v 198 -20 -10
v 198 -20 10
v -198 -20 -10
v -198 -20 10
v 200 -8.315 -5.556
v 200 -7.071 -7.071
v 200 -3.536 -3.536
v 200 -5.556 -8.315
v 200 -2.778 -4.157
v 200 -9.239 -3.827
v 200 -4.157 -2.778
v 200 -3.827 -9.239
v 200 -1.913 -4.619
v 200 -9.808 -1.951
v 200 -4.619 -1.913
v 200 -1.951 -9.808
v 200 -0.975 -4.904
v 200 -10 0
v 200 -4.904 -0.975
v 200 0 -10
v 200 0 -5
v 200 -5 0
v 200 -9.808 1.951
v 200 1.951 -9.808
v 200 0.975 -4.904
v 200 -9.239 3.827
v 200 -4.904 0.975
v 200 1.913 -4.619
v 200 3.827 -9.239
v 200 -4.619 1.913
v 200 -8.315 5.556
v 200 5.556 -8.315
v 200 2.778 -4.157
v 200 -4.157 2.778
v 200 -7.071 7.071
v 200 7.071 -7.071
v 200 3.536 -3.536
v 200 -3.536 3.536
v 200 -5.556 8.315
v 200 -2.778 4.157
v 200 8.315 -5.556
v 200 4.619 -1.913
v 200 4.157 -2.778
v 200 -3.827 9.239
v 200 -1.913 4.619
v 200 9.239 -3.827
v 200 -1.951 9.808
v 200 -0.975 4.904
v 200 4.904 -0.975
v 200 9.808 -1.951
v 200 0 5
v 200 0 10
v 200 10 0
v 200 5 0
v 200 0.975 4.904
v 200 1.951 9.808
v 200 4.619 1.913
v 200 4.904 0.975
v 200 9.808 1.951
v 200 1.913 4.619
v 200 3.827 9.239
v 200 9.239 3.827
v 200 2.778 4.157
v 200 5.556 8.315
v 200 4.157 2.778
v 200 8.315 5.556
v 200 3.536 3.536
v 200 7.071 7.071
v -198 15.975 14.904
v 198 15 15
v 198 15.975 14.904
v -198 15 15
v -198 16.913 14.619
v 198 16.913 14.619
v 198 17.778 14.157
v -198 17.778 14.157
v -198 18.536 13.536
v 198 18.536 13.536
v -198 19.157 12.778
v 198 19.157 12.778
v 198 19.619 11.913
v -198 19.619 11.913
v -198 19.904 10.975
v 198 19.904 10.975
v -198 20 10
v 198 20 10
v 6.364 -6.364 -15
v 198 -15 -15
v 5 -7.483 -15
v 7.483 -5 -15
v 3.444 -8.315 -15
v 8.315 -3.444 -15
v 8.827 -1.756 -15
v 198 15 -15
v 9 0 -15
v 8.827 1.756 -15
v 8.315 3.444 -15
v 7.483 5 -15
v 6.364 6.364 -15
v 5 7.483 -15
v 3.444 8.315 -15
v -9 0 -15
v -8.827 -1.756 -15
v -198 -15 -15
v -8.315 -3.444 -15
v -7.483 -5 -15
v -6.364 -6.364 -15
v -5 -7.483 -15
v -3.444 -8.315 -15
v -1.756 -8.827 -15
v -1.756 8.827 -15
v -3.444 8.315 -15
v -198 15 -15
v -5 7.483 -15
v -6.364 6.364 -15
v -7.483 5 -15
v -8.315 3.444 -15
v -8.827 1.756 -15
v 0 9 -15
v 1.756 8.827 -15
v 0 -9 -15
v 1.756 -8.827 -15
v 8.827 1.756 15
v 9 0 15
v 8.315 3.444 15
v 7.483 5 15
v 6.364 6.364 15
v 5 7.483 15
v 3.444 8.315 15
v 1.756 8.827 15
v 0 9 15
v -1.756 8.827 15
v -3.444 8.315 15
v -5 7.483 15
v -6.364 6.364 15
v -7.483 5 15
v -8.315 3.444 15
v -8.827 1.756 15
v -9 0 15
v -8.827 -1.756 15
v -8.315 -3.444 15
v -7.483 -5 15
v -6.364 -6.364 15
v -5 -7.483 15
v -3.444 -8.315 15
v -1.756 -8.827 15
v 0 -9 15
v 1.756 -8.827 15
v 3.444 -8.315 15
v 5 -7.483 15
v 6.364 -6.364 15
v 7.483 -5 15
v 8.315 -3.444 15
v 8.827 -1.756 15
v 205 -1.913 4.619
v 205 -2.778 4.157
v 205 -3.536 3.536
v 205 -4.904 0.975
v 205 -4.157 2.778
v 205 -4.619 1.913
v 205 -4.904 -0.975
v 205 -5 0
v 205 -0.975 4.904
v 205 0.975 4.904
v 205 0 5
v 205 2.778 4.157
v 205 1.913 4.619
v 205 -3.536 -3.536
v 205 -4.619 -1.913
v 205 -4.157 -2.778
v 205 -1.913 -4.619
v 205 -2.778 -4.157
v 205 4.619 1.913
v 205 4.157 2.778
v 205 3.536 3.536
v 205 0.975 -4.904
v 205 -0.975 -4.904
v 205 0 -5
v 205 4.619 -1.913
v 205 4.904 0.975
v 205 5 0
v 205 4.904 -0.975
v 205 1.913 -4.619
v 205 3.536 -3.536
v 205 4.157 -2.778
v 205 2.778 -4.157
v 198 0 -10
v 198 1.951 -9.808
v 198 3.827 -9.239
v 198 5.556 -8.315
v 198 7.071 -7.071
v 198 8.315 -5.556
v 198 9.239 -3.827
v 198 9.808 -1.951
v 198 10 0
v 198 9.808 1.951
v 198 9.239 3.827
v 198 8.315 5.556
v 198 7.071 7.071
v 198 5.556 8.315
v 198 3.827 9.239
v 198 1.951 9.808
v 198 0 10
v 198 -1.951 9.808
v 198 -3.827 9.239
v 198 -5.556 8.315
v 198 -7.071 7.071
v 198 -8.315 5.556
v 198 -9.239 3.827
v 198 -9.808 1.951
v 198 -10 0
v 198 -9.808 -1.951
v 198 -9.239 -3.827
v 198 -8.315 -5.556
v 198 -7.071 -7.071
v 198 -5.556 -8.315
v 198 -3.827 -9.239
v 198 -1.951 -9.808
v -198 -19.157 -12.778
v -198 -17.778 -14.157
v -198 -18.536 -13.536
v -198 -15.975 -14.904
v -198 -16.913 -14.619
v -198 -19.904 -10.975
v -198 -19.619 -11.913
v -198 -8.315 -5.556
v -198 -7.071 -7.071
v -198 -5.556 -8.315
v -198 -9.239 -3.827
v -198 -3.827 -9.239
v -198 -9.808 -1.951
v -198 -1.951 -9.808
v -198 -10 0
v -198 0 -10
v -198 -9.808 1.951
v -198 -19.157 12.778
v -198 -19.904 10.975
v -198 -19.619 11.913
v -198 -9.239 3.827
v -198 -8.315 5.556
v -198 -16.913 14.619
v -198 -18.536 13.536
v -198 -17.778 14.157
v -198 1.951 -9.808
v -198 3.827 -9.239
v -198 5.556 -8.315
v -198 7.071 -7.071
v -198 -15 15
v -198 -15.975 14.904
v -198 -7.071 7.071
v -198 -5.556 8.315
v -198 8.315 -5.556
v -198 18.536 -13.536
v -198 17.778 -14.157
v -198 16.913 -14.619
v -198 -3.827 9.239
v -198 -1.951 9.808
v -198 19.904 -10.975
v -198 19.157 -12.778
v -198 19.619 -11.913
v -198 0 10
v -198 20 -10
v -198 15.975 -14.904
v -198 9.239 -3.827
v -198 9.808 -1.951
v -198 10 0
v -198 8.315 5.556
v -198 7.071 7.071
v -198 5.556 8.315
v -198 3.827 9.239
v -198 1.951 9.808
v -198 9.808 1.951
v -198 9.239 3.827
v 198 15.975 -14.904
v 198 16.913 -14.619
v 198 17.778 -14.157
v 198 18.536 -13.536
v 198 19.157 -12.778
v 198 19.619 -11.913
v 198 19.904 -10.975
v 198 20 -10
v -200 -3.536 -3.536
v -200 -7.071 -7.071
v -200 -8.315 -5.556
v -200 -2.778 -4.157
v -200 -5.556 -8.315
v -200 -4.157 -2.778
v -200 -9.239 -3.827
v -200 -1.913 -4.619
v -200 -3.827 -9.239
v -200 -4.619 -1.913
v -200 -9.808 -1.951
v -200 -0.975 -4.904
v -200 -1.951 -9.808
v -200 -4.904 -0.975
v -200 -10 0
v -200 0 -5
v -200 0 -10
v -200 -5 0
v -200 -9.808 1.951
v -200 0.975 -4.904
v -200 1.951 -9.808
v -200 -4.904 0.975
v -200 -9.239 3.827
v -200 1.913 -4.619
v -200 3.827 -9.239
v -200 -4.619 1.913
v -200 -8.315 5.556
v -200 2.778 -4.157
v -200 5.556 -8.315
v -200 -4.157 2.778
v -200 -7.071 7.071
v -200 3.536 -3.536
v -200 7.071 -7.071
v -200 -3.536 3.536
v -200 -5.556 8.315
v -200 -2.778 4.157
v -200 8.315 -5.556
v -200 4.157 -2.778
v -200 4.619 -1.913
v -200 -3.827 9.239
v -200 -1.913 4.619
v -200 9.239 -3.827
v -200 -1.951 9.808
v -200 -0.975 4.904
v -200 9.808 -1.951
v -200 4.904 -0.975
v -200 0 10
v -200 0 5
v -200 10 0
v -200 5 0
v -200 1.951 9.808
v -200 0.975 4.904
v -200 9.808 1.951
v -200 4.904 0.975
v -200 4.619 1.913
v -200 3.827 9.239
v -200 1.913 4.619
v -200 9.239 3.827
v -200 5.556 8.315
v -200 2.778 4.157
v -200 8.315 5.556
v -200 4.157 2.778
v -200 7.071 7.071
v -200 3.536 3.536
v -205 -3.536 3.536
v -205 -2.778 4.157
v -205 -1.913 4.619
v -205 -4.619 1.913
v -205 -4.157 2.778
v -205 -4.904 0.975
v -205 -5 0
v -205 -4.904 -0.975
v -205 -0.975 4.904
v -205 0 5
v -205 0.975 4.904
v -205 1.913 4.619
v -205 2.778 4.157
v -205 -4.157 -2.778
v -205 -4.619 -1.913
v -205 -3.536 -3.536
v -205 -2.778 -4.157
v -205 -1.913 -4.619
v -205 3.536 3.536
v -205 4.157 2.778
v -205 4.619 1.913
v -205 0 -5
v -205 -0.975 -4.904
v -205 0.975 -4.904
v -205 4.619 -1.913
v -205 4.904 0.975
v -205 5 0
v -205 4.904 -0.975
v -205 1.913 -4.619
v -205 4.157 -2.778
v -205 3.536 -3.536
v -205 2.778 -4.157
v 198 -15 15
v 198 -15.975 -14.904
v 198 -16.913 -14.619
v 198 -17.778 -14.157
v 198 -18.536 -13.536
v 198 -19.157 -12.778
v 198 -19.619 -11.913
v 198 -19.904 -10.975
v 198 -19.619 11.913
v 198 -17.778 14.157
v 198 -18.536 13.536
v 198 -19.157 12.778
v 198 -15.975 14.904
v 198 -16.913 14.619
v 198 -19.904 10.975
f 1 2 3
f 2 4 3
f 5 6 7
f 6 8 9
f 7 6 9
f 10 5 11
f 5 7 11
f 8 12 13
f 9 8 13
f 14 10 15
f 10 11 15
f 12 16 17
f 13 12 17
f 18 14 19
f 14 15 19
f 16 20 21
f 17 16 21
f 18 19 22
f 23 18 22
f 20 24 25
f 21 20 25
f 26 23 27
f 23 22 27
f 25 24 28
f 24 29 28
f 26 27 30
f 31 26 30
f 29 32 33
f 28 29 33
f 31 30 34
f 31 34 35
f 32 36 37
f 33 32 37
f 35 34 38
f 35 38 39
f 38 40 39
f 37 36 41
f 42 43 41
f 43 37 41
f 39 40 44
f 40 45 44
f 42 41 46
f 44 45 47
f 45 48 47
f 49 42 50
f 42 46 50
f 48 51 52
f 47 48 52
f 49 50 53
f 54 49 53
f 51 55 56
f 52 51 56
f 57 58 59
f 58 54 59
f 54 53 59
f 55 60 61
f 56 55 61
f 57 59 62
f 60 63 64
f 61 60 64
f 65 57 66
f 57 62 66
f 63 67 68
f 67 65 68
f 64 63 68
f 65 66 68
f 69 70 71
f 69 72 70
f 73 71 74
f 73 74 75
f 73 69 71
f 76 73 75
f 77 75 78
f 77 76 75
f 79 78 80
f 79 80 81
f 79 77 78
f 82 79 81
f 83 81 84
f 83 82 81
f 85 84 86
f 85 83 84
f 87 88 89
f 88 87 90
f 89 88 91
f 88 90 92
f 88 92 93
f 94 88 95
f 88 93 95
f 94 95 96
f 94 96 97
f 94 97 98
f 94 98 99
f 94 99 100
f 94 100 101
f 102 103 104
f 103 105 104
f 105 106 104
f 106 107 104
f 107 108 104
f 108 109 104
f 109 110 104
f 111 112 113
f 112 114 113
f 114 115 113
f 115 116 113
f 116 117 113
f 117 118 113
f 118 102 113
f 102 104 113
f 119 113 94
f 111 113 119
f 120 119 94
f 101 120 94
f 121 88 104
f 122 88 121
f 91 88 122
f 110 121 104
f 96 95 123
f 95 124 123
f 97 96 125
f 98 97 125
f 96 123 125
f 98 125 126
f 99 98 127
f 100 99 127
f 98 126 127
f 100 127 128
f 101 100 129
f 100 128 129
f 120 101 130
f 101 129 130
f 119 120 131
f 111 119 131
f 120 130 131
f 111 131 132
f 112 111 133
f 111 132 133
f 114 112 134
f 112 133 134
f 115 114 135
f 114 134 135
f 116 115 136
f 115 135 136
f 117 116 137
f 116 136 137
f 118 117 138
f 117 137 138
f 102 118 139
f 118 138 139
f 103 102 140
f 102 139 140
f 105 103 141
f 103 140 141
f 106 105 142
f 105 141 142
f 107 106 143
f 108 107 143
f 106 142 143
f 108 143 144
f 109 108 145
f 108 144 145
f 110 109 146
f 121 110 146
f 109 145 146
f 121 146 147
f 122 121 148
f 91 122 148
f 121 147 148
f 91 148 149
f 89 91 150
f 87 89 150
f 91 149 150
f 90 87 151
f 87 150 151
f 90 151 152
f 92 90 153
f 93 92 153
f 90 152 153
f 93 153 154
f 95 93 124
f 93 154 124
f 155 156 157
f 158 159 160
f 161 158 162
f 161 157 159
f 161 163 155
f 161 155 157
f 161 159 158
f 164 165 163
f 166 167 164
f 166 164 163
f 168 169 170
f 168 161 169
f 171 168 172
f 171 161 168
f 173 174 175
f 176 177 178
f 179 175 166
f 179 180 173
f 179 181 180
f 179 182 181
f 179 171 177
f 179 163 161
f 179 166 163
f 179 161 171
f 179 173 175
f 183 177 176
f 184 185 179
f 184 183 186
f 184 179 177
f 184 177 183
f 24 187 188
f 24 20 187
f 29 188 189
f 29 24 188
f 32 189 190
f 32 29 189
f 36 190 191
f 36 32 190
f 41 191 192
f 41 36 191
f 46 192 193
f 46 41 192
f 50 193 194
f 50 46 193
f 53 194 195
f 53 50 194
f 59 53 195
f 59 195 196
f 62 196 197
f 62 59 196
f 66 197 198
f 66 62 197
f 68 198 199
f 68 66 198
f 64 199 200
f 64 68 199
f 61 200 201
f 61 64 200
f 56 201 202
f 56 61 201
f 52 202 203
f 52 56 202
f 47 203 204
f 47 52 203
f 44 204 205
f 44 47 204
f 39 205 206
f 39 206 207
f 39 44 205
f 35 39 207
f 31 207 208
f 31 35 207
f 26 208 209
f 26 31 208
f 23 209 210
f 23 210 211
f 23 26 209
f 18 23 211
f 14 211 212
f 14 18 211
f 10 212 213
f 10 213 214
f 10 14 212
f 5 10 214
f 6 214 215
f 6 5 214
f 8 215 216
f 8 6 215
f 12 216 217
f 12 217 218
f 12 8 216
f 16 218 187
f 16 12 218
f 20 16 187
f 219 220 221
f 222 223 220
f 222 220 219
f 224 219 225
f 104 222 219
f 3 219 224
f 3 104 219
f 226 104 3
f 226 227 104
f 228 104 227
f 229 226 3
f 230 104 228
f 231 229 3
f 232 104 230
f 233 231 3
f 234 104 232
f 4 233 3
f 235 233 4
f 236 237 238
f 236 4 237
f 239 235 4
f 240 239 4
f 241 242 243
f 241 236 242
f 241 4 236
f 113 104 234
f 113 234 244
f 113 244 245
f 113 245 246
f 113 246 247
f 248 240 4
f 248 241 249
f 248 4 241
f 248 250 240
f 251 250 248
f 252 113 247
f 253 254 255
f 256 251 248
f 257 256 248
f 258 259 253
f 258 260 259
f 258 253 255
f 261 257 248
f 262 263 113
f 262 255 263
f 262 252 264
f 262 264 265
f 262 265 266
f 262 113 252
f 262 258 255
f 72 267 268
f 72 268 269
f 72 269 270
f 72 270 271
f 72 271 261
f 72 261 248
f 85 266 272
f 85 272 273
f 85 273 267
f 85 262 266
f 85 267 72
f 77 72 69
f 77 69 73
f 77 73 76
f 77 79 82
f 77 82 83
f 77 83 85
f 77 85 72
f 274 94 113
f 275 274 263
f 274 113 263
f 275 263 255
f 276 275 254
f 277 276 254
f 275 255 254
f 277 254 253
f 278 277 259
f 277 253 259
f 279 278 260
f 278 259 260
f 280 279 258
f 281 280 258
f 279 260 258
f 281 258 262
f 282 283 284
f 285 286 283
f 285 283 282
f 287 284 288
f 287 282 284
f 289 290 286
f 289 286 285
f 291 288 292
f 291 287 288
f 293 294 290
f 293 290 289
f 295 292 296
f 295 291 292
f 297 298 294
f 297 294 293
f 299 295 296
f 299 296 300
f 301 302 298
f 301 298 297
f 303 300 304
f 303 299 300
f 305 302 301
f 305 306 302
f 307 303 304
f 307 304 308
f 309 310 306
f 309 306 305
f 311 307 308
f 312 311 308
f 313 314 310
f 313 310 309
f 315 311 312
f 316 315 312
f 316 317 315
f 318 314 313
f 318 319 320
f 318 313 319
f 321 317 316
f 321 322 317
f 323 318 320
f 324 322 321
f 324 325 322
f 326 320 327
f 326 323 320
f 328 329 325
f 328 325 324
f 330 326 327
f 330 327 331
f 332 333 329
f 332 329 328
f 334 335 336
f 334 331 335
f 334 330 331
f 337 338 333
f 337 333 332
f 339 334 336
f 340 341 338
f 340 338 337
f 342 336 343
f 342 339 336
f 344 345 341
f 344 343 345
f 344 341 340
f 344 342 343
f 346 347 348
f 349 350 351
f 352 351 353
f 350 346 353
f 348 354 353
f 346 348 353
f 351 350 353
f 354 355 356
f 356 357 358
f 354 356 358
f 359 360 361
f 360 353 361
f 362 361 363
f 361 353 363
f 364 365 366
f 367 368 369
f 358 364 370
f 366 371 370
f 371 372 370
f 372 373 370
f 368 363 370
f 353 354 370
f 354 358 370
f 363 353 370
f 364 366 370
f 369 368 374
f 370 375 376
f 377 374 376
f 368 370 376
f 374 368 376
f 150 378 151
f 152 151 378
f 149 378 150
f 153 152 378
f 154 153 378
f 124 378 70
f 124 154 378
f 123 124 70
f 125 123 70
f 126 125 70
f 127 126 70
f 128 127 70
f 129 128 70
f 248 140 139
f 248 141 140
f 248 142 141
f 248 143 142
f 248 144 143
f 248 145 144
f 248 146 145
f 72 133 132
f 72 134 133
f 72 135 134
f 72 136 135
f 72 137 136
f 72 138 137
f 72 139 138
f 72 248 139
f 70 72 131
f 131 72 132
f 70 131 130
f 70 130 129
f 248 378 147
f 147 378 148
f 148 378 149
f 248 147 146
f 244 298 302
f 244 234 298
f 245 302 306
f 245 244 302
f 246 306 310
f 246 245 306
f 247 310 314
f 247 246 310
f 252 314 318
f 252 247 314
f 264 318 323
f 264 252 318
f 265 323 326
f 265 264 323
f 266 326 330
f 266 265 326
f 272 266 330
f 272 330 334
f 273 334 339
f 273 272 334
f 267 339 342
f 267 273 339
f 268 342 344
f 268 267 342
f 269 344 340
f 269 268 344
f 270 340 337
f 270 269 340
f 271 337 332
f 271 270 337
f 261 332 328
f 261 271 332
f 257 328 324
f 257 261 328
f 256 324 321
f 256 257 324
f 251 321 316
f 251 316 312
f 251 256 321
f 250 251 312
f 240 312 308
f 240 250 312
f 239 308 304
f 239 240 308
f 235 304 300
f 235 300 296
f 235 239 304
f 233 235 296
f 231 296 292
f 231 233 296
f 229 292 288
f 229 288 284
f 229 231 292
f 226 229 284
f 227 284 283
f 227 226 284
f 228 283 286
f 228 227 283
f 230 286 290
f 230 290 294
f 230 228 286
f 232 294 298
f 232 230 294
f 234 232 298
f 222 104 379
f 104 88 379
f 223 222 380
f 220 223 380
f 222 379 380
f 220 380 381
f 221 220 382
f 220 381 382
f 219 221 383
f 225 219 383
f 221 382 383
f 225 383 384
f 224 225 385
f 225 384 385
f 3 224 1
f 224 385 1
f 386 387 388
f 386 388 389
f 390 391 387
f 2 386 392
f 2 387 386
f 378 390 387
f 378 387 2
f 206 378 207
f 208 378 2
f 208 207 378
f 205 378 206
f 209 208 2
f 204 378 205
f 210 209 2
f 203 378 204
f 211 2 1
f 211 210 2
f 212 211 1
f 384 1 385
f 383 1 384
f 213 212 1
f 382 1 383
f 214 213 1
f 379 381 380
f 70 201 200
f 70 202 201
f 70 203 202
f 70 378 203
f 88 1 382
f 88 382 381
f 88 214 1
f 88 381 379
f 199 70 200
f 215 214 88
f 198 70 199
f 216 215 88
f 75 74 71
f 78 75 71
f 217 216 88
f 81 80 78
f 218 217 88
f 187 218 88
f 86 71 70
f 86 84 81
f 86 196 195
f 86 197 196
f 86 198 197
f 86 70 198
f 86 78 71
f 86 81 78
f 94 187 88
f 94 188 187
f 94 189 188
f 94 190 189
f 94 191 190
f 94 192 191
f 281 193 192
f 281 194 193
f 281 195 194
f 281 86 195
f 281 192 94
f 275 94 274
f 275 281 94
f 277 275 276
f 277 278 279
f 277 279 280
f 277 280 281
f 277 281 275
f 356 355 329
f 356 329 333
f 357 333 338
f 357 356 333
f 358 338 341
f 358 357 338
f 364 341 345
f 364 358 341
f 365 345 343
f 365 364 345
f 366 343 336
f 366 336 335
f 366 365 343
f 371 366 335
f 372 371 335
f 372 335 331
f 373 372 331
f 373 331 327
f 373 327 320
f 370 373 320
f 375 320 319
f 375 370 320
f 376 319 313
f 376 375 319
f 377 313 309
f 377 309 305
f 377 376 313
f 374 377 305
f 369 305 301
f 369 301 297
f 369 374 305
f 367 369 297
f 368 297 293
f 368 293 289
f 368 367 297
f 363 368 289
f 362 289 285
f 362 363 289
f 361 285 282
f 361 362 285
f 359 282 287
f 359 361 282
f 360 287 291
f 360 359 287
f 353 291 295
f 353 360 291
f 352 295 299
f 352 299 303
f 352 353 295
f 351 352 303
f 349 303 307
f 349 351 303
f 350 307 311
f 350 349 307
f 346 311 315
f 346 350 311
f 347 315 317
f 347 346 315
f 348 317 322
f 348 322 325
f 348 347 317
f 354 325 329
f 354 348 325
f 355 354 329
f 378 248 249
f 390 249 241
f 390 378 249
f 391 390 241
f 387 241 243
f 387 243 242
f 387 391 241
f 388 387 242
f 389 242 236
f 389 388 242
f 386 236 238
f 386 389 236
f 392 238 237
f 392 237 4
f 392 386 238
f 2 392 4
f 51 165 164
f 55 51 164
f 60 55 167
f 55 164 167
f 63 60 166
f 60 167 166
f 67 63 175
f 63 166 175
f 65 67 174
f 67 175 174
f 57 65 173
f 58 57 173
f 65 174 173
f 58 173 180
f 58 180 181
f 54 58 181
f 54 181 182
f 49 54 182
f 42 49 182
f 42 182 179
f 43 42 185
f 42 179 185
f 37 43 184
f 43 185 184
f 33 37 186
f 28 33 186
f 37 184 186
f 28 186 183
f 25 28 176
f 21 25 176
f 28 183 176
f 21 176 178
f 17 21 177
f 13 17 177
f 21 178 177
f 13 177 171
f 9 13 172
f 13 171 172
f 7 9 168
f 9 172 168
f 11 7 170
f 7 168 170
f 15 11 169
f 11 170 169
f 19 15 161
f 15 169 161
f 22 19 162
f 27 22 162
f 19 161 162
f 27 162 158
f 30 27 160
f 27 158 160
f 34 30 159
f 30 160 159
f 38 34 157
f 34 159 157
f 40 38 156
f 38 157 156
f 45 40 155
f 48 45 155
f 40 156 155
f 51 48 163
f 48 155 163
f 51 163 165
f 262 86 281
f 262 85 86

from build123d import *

# Parameters (mm, degrees)
SKETCH1_R           = 10
BOSS_EXTRUDE1_DEPTH = 205
SKETCH2_R           = 12.5
SKETCH2_R_2         = 5
CUT_EXTRUDE1_DEPTH  = 5
SKETCH3_W           = 40
SKETCH3_H           = 40
BOSS_EXTRUDE5_DEPTH = 15
SKETCH4_R           = 9
CUT_EXTRUDE2_DEPTH  = 15
FILLET2_R           = 2
SKETCH5_W           = 30
SKETCH5_H           = 40
BOSS_EXTRUDE6_DEPTH = 178
SKETCH6_W           = 30
SKETCH6_H           = 40
BOSS_EXTRUDE7_DEPTH = 178
FILLET3_R           = 5


with BuildPart() as part:
    # Sketch1 → Boss-Extrude1 (new body, symmetric)
    with BuildSketch(Plane(origin=(0, 0, 0), x_dir=(0, 0, -1), z_dir=(1, 0, 0))):
        Circle(SKETCH1_R)
    extrude(amount=BOSS_EXTRUDE1_DEPTH, both=True)

    # Sketch2 → Cut-Extrude1 (cut)
    with BuildSketch(Plane.ZY.offset(205)):
        Circle(SKETCH2_R)
        Circle(SKETCH2_R_2, mode=Mode.SUBTRACT)
    cut_extrude1 = extrude(amount=-CUT_EXTRUDE1_DEPTH, mode=Mode.SUBTRACT)

    # Mirror1: Cut-Extrude1 across plane
    add(cut_extrude1.mirror(Plane(origin=(0, 0, 0), x_dir=(0, 0, 1), z_dir=(1, 0, 0))), mode=Mode.SUBTRACT)

    # Sketch3 → Boss-Extrude5 (add, symmetric)
    with BuildSketch(Plane.XY):
        Rectangle(SKETCH3_W, SKETCH3_H)
    extrude(amount=BOSS_EXTRUDE5_DEPTH, both=True)

    # Sketch4 → Cut-Extrude2 (cut, symmetric)
    with BuildSketch(Plane.XY):
        Circle(SKETCH4_R)
    extrude(amount=CUT_EXTRUDE2_DEPTH, both=True, mode=Mode.SUBTRACT)

    # Fillet2
    fillet2_edges = [part.edges().sort_by_distance(p)[0] for p in [
        (-20, 0, 10),
        (20, 0, 10),
    ]]
    fillet(fillet2_edges, radius=FILLET2_R)

    # Sketch5 → Boss-Extrude6 (add)
    with BuildSketch(Plane.ZY.offset(20)):
        Rectangle(SKETCH5_W, SKETCH5_H)
    extrude(amount=BOSS_EXTRUDE6_DEPTH)

    # Sketch6 → Boss-Extrude7 (add)
    with BuildSketch(Plane(origin=(20, 0, 0), x_dir=(0, 0, -1), z_dir=(1, 0, 0))):
        Rectangle(SKETCH6_W, SKETCH6_H)
    extrude(amount=BOSS_EXTRUDE7_DEPTH)

    # Fillet3
    fillet3_edges = [part.edges().sort_by_distance(p)[0] for p in [
        (0, -20, -15),
        (0, 20, 15),
        (0, -20, 15),
        (0, 20, -15),
    ]]
    fillet(fillet3_edges, radius=FILLET3_R)


solid = part.part
